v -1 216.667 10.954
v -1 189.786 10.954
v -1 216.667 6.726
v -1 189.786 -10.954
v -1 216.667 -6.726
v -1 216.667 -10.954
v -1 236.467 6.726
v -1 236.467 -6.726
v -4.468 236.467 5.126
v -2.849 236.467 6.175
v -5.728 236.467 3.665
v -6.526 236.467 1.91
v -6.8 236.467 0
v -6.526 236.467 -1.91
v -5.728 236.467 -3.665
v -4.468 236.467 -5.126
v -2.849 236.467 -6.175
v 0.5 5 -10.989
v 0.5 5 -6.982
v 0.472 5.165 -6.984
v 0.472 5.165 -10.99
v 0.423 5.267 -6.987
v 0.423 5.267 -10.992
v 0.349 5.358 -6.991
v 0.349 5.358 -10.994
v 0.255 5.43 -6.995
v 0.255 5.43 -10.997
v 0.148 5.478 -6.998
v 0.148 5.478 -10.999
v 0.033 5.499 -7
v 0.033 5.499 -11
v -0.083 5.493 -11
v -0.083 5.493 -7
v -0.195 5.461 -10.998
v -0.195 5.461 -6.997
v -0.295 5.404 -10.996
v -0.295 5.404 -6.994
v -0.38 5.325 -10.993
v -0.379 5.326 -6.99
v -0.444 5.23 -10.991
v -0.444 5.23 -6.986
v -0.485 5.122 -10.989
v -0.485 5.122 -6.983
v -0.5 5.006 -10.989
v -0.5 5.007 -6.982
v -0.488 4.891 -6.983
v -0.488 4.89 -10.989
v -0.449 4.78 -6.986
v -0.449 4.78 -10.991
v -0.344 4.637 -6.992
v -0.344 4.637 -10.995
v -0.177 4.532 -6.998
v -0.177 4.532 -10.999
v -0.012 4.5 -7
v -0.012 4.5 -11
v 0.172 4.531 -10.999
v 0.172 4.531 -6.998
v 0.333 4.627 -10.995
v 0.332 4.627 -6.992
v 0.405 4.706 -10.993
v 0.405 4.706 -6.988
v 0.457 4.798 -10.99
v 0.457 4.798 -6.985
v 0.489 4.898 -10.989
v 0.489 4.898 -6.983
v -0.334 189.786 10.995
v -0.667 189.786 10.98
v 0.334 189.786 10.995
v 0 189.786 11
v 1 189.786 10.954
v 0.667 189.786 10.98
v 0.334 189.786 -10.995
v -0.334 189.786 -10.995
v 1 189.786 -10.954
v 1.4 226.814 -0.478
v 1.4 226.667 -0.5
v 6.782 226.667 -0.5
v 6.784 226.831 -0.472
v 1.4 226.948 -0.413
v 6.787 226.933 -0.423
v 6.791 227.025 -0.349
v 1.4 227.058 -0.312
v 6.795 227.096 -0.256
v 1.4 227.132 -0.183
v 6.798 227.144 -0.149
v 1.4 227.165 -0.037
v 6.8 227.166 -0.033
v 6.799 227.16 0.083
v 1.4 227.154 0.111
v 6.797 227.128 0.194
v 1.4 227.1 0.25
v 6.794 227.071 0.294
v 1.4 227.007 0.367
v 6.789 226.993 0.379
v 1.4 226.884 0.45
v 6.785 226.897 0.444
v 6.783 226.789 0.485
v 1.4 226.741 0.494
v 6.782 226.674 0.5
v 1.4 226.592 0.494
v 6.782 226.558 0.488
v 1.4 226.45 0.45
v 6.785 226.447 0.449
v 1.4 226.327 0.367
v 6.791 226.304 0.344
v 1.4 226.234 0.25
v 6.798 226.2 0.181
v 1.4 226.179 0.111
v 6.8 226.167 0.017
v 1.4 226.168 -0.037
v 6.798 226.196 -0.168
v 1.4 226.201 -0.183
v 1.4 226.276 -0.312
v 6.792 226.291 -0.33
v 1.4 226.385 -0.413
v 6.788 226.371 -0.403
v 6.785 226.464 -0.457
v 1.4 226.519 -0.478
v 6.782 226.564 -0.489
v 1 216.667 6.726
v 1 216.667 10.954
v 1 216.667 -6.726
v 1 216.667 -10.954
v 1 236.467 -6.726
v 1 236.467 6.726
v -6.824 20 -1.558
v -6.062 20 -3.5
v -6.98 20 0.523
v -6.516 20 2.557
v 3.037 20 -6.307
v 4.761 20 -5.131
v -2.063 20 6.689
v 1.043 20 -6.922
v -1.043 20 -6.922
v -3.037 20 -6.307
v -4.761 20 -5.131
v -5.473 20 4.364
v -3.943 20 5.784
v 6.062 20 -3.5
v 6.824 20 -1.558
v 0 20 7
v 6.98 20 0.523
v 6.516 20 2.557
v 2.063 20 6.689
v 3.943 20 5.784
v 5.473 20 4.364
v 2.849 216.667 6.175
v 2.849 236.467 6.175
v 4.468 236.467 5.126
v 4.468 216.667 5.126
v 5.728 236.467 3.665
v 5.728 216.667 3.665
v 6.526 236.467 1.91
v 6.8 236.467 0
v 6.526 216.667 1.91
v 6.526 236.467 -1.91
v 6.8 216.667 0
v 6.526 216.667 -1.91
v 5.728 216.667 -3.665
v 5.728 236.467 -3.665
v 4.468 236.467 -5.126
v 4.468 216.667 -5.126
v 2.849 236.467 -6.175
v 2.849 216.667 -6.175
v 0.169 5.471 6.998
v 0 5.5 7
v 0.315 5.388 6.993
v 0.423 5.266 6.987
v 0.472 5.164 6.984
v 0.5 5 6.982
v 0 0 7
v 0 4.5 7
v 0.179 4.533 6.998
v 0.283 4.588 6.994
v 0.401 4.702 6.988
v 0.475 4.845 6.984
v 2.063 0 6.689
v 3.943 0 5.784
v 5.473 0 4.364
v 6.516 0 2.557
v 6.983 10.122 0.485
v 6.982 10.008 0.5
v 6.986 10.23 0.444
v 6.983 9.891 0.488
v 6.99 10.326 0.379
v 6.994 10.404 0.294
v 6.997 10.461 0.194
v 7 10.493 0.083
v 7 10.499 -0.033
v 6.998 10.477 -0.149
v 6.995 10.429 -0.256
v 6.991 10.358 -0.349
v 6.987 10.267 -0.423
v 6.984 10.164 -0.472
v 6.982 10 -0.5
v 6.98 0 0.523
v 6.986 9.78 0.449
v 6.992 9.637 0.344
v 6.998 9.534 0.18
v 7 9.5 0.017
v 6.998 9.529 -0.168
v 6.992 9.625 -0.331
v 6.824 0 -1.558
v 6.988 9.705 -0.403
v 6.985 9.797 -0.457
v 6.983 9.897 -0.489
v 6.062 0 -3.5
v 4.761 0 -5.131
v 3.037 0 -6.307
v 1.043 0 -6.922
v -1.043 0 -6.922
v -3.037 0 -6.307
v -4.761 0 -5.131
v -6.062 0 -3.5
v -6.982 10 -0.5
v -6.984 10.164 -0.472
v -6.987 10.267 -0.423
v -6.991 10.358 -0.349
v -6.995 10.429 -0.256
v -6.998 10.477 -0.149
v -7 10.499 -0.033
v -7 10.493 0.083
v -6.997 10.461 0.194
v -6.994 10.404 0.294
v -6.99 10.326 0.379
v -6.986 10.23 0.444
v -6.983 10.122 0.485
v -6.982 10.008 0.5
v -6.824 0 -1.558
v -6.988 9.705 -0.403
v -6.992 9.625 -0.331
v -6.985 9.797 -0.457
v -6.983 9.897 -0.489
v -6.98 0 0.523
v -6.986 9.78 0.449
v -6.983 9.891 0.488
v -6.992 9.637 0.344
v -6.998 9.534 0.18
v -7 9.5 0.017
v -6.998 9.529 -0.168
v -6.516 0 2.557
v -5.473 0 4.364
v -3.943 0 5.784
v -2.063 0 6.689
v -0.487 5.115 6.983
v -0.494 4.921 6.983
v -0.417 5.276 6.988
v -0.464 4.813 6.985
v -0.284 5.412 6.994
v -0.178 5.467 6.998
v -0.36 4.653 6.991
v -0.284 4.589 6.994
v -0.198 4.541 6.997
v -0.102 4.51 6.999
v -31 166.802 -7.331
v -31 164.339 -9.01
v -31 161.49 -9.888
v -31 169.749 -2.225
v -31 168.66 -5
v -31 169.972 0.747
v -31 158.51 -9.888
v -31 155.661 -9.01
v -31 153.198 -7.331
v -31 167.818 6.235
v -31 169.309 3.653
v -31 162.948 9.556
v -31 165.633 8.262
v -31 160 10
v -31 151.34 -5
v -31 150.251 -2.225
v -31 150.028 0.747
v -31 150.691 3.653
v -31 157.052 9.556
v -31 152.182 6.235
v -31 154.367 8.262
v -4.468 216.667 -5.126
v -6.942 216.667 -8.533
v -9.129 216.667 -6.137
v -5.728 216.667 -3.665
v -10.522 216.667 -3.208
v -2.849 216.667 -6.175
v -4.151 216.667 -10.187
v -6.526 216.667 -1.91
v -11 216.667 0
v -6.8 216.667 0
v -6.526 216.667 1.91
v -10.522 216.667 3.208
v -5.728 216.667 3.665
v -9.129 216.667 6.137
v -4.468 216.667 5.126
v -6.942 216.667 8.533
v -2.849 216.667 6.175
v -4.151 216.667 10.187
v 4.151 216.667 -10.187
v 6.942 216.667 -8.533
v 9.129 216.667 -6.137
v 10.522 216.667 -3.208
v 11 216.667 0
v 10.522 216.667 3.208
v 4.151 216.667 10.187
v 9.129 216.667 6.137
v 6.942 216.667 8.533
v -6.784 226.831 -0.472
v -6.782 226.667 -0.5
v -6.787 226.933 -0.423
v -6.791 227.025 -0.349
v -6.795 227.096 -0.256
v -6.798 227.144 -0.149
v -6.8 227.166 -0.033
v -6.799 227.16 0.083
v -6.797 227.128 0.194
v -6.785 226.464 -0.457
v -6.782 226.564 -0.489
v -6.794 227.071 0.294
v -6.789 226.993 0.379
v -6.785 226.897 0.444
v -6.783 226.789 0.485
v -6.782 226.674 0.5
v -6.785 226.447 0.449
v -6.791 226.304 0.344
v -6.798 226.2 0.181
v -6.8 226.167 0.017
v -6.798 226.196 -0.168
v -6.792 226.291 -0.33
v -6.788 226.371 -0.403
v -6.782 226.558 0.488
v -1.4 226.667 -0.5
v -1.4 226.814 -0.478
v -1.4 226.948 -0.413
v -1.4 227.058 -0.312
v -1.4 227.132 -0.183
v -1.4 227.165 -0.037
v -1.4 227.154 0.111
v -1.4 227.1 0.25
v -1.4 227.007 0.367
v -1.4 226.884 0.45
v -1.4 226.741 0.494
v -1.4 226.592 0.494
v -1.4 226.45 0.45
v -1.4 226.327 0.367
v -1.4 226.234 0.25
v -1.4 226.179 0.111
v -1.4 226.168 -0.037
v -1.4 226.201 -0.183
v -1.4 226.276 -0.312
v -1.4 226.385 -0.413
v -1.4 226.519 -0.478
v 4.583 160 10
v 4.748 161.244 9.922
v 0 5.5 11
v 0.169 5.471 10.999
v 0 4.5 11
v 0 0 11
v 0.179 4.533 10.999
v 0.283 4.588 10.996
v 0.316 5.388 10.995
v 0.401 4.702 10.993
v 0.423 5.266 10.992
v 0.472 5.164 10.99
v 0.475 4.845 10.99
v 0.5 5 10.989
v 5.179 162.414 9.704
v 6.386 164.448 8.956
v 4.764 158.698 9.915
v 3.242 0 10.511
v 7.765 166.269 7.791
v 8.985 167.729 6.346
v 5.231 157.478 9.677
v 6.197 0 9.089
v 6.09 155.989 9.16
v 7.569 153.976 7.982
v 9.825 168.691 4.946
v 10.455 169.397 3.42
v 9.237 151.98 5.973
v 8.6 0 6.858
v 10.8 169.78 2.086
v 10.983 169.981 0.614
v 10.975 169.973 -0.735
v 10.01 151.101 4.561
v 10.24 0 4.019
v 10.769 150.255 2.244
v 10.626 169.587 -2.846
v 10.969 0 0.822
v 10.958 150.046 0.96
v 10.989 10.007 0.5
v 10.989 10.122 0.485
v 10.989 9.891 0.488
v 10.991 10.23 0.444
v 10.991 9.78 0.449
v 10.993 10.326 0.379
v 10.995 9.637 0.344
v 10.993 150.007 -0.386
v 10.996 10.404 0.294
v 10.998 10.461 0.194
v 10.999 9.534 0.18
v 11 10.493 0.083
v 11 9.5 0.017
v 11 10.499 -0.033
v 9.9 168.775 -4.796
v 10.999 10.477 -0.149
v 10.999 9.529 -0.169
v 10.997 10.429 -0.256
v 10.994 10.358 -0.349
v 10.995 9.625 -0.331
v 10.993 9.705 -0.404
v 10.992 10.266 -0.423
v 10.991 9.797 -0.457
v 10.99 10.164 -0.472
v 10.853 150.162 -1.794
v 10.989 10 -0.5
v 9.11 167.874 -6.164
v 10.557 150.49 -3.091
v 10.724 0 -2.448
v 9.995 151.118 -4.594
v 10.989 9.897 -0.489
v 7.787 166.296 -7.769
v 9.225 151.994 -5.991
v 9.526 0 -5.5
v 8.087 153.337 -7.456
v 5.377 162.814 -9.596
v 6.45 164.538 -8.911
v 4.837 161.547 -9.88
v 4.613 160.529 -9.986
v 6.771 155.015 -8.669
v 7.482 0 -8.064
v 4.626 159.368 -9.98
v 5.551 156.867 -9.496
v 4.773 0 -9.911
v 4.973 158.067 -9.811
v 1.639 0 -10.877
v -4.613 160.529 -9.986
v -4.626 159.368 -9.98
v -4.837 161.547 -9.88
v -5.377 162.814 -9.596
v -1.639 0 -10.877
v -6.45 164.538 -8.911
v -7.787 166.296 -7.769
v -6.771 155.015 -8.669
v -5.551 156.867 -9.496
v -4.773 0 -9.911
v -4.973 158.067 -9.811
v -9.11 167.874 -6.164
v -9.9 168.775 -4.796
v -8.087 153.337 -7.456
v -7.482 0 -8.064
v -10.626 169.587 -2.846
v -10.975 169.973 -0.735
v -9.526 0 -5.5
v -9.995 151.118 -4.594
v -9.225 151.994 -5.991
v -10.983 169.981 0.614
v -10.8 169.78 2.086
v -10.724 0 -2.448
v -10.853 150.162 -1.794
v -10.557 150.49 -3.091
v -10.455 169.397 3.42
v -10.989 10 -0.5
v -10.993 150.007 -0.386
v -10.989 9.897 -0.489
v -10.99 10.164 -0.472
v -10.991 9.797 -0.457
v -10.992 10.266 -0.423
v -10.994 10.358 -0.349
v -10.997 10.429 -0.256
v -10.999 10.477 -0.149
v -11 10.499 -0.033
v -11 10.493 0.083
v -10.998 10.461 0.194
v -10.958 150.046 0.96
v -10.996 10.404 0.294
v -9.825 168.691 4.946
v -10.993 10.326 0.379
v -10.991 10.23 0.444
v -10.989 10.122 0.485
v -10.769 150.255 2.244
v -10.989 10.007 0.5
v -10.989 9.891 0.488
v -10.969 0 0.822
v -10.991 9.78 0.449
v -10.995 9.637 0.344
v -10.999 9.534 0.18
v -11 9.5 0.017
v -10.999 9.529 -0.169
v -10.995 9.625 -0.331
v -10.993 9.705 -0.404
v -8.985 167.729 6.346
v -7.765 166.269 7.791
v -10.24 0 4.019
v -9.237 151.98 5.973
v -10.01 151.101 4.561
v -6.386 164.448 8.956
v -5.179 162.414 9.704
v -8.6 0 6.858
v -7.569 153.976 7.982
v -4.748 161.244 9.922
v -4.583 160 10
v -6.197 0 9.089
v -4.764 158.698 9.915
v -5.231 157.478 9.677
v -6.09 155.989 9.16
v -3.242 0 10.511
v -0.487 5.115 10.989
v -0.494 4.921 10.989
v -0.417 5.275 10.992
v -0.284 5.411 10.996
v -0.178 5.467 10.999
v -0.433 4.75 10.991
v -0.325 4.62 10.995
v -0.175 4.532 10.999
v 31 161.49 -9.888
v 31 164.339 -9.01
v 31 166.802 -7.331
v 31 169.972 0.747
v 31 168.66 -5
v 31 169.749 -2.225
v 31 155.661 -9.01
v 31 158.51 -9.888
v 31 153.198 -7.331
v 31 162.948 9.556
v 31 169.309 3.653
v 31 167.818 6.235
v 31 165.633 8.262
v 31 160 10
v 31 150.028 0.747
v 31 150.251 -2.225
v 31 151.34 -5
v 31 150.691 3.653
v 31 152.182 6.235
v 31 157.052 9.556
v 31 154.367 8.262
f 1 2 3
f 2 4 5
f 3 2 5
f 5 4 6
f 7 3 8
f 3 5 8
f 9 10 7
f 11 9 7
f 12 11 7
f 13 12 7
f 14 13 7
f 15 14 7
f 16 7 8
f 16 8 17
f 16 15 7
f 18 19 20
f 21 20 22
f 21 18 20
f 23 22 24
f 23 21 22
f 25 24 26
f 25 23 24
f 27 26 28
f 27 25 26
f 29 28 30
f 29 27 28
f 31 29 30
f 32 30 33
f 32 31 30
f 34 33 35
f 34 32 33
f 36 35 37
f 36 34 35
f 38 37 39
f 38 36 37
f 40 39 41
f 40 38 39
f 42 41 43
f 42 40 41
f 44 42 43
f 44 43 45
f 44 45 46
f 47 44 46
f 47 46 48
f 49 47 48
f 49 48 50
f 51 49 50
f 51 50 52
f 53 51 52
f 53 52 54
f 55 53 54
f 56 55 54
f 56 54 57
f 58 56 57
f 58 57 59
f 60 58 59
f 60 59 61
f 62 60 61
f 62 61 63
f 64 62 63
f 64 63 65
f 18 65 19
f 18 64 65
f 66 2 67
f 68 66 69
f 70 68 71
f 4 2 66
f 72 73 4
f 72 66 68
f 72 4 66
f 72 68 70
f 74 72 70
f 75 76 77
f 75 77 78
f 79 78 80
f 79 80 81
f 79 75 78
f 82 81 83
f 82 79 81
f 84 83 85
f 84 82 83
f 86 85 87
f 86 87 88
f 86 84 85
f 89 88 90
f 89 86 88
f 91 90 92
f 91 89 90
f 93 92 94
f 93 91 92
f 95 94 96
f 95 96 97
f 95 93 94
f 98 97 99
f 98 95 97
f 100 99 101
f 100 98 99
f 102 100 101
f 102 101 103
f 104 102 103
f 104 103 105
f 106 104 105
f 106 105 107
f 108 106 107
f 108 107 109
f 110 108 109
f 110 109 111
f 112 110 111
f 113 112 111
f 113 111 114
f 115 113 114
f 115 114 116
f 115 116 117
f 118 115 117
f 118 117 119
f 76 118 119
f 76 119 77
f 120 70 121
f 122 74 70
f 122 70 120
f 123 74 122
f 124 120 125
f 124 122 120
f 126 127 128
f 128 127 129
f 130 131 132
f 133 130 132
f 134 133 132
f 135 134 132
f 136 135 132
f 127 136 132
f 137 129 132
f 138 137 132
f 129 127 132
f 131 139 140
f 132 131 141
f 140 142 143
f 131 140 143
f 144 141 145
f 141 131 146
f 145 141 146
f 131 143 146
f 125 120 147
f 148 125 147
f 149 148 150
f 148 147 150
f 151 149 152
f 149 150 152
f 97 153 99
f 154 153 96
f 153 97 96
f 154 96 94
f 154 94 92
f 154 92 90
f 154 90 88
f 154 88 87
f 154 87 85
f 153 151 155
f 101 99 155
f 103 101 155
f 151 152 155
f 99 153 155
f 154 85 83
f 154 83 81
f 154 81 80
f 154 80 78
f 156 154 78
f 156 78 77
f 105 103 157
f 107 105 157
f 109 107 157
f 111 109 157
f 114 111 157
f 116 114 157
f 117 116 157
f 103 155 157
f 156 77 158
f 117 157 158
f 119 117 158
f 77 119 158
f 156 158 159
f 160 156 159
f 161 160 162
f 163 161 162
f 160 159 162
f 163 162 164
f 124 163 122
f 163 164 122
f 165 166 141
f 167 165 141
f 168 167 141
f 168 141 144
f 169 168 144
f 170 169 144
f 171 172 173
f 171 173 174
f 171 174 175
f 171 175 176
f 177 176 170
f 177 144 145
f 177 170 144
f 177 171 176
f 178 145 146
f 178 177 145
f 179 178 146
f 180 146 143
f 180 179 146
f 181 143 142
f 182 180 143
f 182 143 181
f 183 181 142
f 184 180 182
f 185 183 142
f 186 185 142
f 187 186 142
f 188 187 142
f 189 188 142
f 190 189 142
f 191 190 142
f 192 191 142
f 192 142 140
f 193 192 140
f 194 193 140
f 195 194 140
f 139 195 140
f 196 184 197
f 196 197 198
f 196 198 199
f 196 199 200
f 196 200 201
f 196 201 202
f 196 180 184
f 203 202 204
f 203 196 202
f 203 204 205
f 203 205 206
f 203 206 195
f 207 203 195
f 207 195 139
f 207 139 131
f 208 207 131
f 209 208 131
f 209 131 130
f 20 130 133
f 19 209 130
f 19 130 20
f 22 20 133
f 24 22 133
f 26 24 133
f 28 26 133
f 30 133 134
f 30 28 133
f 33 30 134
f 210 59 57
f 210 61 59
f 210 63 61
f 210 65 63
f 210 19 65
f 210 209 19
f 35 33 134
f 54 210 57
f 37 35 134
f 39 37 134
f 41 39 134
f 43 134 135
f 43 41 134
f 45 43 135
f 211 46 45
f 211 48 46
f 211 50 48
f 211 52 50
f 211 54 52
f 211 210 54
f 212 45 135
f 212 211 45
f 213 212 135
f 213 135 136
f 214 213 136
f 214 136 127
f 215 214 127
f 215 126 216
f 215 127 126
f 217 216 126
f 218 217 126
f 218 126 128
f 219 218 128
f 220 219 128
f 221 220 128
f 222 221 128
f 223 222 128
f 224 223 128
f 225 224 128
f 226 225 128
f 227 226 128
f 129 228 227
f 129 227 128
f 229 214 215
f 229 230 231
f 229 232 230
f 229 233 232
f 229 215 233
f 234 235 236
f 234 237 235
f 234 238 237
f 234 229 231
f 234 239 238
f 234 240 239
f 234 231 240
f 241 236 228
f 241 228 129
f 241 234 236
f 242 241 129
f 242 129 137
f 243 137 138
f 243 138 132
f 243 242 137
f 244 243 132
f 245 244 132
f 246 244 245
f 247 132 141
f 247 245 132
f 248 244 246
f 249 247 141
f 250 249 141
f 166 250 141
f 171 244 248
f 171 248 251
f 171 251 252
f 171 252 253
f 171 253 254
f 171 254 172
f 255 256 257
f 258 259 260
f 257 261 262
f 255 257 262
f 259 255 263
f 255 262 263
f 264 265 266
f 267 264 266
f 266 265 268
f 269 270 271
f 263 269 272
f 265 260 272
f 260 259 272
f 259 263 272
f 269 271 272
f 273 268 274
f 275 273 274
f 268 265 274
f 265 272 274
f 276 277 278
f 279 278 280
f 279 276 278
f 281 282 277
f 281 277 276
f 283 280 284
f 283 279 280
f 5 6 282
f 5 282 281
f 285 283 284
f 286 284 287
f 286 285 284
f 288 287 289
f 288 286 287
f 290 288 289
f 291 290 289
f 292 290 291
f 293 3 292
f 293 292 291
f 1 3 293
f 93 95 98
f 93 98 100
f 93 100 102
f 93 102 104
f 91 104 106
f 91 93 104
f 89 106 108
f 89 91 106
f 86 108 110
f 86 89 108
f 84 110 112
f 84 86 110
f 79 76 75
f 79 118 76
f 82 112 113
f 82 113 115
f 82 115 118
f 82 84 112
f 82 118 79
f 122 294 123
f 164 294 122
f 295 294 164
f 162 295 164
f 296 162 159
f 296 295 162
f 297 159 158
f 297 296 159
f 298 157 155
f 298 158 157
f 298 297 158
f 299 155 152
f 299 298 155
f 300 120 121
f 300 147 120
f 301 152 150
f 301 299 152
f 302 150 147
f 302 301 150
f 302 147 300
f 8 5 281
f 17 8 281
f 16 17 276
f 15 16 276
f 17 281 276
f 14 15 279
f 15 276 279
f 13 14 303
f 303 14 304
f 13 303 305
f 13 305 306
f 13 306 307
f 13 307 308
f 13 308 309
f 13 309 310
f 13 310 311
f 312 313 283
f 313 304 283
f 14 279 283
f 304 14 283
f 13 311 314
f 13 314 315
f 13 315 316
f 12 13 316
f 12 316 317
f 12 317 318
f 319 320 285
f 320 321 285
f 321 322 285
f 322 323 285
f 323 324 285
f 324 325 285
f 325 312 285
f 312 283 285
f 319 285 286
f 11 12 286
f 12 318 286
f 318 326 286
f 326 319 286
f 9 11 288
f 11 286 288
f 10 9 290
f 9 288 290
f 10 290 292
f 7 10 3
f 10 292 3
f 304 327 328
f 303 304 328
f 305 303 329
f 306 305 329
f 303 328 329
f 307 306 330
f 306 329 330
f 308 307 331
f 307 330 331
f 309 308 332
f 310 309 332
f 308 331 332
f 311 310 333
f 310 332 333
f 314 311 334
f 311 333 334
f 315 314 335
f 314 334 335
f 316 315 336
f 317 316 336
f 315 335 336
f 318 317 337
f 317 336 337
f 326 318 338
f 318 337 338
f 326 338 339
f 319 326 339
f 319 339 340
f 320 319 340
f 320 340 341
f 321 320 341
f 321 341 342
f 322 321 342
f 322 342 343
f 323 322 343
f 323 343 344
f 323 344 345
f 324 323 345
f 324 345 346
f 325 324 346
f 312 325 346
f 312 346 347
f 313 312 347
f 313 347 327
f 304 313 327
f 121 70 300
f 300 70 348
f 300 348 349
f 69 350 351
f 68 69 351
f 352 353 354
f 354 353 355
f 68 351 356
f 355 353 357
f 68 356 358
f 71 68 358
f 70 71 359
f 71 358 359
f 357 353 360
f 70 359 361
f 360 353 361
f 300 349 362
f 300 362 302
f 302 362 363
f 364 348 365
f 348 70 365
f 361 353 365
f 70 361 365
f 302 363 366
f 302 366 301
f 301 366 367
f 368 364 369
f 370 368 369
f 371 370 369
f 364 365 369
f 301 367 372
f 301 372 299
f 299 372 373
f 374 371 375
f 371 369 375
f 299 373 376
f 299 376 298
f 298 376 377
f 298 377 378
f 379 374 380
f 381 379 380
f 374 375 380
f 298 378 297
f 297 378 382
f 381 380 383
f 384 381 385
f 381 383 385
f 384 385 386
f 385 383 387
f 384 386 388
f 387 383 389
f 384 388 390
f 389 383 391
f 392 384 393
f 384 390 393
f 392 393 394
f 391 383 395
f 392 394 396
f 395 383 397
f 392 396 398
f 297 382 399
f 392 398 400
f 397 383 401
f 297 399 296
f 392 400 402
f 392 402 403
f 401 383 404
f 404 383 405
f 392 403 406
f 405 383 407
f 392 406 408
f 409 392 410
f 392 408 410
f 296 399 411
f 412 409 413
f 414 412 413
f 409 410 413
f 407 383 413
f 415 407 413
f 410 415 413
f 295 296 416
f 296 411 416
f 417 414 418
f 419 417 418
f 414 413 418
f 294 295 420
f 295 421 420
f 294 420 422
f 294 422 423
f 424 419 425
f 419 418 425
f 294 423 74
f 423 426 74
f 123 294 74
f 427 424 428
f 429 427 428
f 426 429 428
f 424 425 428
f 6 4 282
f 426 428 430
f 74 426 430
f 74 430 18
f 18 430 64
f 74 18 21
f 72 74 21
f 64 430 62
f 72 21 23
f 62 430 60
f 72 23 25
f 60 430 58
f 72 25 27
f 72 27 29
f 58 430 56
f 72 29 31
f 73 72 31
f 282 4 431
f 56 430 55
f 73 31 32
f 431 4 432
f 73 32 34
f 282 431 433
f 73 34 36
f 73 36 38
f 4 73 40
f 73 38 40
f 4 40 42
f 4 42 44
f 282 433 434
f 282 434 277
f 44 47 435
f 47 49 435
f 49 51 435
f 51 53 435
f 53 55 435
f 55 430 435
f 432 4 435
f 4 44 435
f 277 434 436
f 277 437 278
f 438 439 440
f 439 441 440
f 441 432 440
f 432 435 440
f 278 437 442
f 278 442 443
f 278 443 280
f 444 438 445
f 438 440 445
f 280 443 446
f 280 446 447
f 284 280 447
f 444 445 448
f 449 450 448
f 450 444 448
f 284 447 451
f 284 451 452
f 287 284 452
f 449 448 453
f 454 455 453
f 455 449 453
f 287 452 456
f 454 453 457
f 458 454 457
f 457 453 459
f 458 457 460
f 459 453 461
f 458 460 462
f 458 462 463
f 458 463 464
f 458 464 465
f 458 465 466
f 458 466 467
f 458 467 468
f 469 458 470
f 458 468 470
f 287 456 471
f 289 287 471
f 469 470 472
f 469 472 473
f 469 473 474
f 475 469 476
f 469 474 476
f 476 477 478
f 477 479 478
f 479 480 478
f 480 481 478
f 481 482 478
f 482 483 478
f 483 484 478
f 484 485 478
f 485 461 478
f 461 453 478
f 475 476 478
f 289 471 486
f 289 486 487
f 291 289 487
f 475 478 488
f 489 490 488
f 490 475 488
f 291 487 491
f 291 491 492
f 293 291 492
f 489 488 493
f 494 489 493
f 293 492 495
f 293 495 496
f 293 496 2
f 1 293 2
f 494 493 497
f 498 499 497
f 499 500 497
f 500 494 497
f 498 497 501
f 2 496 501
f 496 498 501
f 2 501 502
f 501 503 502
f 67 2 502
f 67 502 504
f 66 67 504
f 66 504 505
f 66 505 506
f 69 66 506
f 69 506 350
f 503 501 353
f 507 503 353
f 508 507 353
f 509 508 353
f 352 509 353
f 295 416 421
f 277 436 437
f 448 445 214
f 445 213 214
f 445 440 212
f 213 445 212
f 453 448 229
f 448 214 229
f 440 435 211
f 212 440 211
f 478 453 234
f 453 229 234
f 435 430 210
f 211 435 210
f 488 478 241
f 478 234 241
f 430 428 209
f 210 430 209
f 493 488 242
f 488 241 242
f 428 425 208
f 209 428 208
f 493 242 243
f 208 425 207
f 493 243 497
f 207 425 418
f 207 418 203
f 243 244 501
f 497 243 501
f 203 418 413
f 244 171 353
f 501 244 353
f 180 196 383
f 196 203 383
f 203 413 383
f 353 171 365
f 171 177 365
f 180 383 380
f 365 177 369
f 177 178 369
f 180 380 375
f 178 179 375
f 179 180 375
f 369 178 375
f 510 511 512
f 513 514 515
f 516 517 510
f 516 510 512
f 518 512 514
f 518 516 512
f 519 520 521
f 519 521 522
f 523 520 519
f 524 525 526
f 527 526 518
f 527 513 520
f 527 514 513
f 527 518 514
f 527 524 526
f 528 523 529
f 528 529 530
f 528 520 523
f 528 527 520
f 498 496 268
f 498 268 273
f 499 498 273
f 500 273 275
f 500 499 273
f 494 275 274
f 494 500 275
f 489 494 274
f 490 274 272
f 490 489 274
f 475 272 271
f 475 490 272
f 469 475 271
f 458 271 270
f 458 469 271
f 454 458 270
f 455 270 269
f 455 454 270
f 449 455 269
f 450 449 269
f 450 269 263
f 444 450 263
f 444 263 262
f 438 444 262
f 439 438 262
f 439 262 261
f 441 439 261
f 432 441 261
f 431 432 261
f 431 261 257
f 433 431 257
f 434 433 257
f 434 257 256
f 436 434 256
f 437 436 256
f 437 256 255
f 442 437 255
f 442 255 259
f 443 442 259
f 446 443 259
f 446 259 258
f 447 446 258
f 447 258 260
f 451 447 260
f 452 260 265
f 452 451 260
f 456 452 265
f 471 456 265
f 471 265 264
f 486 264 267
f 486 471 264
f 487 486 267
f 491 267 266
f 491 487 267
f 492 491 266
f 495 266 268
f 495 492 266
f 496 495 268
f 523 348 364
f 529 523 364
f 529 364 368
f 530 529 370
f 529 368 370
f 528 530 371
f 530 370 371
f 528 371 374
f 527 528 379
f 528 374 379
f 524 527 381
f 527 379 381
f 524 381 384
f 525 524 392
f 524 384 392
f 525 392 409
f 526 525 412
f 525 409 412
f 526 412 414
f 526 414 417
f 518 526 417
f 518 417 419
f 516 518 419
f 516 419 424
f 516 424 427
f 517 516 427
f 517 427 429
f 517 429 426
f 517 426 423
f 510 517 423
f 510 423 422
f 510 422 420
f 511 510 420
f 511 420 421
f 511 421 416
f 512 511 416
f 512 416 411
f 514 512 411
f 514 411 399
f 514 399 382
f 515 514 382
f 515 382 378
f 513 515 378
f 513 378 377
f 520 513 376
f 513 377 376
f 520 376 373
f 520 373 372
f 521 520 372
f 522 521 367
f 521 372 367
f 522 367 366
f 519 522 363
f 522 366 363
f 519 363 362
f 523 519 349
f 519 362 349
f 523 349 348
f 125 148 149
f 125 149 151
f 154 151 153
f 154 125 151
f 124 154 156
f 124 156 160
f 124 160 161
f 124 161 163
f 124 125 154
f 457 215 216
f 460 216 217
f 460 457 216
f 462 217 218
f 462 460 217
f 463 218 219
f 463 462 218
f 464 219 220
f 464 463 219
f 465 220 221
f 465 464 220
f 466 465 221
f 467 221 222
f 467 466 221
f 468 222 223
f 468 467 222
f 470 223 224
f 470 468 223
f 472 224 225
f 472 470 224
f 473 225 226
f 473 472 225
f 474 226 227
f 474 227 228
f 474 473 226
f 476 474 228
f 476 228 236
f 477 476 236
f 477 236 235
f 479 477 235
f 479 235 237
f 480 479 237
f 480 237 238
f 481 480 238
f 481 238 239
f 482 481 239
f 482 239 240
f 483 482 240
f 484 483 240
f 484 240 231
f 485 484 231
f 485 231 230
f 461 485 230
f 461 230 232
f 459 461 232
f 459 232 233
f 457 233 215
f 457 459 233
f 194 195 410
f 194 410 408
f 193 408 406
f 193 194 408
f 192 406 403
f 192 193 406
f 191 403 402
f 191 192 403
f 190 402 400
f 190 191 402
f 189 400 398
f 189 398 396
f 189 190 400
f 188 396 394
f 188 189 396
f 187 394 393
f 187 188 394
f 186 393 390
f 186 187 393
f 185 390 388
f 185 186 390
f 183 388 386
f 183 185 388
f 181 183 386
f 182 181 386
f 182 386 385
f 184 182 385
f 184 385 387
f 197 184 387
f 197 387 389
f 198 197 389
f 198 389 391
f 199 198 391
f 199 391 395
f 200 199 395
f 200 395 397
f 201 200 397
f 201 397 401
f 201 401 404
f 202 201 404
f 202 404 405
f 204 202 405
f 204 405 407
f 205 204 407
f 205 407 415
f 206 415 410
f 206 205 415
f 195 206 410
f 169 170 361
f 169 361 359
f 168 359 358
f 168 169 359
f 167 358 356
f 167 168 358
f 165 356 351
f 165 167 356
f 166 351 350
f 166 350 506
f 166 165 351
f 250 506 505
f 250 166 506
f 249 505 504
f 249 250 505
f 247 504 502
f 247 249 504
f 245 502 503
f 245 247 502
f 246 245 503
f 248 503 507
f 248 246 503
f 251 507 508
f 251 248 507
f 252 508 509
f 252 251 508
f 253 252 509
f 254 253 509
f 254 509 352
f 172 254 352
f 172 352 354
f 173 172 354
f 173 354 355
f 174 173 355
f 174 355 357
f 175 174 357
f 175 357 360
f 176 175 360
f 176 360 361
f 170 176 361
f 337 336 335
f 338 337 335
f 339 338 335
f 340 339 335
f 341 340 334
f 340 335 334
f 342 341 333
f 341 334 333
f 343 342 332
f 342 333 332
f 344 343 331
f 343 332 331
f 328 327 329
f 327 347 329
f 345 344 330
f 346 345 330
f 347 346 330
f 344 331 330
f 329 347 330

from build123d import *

# Parameters (mm, degrees)
SKETCH1_R               = 11
BOSS_EXTRUDE1_DEPTH     = 216.66667
BOSS_EXTRUDE2_START     = 216.66667
SKETCH2_R               = 6.8
BOSS_EXTRUDE2_DEPTH     = 19.8
CUT_EXTRUDE2_START      = -1.4
SKETCH4_R               = 0.5
CUT_EXTRUDE2_DEPTH      = 9
SKETCH6_R               = 7
CUT_EXTRUDE3_DEPTH      = 20
CUT_EXTRUDE4_DEPTH      = 237.977817671
CUT_EXTRUDE4_DEPTH_BACK = 237.977817671
SKETCH7_R               = 0.5
CUT_EXTRUDE5_DEPTH      = 237.97781768
CUT_EXTRUDE5_DEPTH_BACK = 237.97781768
SKETCH10_R              = 0.5
CUT_EXTRUDE6_DEPTH      = 237.97781768
CUT_EXTRUDE6_DEPTH_BACK = 237.97781768
SKETCH11_W              = 2
SKETCH11_H              = 46.680194511
BOSS_EXTRUDE3_START     = 2.5
SKETCH14_R              = 10
BOSS_EXTRUDE3_DEPTH     = 28.5


with BuildPart() as part:
    # Sketch1 → Boss-Extrude1 (new body)
    with BuildSketch(Plane(origin=(0, 0, 0), x_dir=(1, 0, 0), z_dir=(0, 1, 0))):
        with Locations(Location((0, 0, 0), (0, 0, 270))):
            Circle(SKETCH1_R)
    extrude(amount=BOSS_EXTRUDE1_DEPTH)

    # Sketch2 → Boss-Extrude2 (add)
    with BuildSketch(Plane(origin=(0, 0, 0), x_dir=(1, 0, 0), z_dir=(0, 1, 0)).offset(BOSS_EXTRUDE2_START)):
        with Locations(Location((0, 0, 0), (0, 0, 90))):
            Circle(SKETCH2_R)
    extrude(amount=BOSS_EXTRUDE2_DEPTH)

    # Sketch4 → Cut-Extrude2 (cut)
    with BuildSketch(Plane(origin=(0, 0, 0), x_dir=(0, 0, -1), z_dir=(1, 0, 0)).offset(CUT_EXTRUDE2_START)):
        with Locations((0, 226.66667)):
            Circle(SKETCH4_R)
    cut_extrude2 = extrude(amount=-CUT_EXTRUDE2_DEPTH, mode=Mode.SUBTRACT)

    # Mirror2: Cut-Extrude2 across plane
    add(cut_extrude2.mirror(Plane(origin=(0, 0, 0), x_dir=(0, 0, 1), z_dir=(1, 0, 0))), mode=Mode.SUBTRACT)

    # Sketch6 → Cut-Extrude3 (cut)
    with BuildSketch(Plane(origin=(0, 0, 0), x_dir=(1, 0, 0), z_dir=(0, 1, 0))):
        with Locations(Location((0, 0, 0), (0, 0, 270))):
            Circle(SKETCH6_R)
    extrude(amount=CUT_EXTRUDE3_DEPTH, mode=Mode.SUBTRACT)

    # Sketch7 → Cut-Extrude4 (cut, two sides: drawn at the far end of the back side and taken through both)
    with BuildSketch(Plane(origin=(0, 0, 0), x_dir=(0, 0, -1), z_dir=(1, 0, 0)).offset(-CUT_EXTRUDE4_DEPTH_BACK)):
        with Locations((0, 10)):
            Circle(SKETCH7_R)
    extrude(amount=CUT_EXTRUDE4_DEPTH + CUT_EXTRUDE4_DEPTH_BACK, mode=Mode.SUBTRACT)

    # Sketch10 → Cut-Extrude5 (cut, two sides: drawn at the far end of the back side and taken through both)
    with BuildSketch(Plane.XY.offset(-CUT_EXTRUDE5_DEPTH_BACK)):
        with Locations((0, 5)):
            Circle(SKETCH10_R)
    extrude(amount=CUT_EXTRUDE5_DEPTH + CUT_EXTRUDE5_DEPTH_BACK, mode=Mode.SUBTRACT)

    # Sketch11 → Cut-Extrude6 (cut, two sides: drawn at the far end of the back side and taken through both)
    with BuildSketch(Plane.XY.offset(-CUT_EXTRUDE6_DEPTH_BACK)):
        with Locations((0, 213.126572745)):
            Rectangle(SKETCH11_W, SKETCH11_H)
    extrude(amount=CUT_EXTRUDE6_DEPTH + CUT_EXTRUDE6_DEPTH_BACK, mode=Mode.SUBTRACT)

    # Sketch14 → Boss-Extrude3 (add)
    with BuildSketch(Plane(origin=(0, 0, 0), x_dir=(0, 0, -1), z_dir=(1, 0, 0)).offset(BOSS_EXTRUDE3_START)):
        with Locations(Location((0, 160, 0), (0, 0, 180))):
            Circle(SKETCH14_R)
    boss_extrude3 = extrude(amount=BOSS_EXTRUDE3_DEPTH)

    # Mirror3: Boss-Extrude3 across plane
    add(boss_extrude3.mirror(Plane(origin=(0, 0, 0), x_dir=(0, 0, 1), z_dir=(1, 0, 0))))


solid = part.part
